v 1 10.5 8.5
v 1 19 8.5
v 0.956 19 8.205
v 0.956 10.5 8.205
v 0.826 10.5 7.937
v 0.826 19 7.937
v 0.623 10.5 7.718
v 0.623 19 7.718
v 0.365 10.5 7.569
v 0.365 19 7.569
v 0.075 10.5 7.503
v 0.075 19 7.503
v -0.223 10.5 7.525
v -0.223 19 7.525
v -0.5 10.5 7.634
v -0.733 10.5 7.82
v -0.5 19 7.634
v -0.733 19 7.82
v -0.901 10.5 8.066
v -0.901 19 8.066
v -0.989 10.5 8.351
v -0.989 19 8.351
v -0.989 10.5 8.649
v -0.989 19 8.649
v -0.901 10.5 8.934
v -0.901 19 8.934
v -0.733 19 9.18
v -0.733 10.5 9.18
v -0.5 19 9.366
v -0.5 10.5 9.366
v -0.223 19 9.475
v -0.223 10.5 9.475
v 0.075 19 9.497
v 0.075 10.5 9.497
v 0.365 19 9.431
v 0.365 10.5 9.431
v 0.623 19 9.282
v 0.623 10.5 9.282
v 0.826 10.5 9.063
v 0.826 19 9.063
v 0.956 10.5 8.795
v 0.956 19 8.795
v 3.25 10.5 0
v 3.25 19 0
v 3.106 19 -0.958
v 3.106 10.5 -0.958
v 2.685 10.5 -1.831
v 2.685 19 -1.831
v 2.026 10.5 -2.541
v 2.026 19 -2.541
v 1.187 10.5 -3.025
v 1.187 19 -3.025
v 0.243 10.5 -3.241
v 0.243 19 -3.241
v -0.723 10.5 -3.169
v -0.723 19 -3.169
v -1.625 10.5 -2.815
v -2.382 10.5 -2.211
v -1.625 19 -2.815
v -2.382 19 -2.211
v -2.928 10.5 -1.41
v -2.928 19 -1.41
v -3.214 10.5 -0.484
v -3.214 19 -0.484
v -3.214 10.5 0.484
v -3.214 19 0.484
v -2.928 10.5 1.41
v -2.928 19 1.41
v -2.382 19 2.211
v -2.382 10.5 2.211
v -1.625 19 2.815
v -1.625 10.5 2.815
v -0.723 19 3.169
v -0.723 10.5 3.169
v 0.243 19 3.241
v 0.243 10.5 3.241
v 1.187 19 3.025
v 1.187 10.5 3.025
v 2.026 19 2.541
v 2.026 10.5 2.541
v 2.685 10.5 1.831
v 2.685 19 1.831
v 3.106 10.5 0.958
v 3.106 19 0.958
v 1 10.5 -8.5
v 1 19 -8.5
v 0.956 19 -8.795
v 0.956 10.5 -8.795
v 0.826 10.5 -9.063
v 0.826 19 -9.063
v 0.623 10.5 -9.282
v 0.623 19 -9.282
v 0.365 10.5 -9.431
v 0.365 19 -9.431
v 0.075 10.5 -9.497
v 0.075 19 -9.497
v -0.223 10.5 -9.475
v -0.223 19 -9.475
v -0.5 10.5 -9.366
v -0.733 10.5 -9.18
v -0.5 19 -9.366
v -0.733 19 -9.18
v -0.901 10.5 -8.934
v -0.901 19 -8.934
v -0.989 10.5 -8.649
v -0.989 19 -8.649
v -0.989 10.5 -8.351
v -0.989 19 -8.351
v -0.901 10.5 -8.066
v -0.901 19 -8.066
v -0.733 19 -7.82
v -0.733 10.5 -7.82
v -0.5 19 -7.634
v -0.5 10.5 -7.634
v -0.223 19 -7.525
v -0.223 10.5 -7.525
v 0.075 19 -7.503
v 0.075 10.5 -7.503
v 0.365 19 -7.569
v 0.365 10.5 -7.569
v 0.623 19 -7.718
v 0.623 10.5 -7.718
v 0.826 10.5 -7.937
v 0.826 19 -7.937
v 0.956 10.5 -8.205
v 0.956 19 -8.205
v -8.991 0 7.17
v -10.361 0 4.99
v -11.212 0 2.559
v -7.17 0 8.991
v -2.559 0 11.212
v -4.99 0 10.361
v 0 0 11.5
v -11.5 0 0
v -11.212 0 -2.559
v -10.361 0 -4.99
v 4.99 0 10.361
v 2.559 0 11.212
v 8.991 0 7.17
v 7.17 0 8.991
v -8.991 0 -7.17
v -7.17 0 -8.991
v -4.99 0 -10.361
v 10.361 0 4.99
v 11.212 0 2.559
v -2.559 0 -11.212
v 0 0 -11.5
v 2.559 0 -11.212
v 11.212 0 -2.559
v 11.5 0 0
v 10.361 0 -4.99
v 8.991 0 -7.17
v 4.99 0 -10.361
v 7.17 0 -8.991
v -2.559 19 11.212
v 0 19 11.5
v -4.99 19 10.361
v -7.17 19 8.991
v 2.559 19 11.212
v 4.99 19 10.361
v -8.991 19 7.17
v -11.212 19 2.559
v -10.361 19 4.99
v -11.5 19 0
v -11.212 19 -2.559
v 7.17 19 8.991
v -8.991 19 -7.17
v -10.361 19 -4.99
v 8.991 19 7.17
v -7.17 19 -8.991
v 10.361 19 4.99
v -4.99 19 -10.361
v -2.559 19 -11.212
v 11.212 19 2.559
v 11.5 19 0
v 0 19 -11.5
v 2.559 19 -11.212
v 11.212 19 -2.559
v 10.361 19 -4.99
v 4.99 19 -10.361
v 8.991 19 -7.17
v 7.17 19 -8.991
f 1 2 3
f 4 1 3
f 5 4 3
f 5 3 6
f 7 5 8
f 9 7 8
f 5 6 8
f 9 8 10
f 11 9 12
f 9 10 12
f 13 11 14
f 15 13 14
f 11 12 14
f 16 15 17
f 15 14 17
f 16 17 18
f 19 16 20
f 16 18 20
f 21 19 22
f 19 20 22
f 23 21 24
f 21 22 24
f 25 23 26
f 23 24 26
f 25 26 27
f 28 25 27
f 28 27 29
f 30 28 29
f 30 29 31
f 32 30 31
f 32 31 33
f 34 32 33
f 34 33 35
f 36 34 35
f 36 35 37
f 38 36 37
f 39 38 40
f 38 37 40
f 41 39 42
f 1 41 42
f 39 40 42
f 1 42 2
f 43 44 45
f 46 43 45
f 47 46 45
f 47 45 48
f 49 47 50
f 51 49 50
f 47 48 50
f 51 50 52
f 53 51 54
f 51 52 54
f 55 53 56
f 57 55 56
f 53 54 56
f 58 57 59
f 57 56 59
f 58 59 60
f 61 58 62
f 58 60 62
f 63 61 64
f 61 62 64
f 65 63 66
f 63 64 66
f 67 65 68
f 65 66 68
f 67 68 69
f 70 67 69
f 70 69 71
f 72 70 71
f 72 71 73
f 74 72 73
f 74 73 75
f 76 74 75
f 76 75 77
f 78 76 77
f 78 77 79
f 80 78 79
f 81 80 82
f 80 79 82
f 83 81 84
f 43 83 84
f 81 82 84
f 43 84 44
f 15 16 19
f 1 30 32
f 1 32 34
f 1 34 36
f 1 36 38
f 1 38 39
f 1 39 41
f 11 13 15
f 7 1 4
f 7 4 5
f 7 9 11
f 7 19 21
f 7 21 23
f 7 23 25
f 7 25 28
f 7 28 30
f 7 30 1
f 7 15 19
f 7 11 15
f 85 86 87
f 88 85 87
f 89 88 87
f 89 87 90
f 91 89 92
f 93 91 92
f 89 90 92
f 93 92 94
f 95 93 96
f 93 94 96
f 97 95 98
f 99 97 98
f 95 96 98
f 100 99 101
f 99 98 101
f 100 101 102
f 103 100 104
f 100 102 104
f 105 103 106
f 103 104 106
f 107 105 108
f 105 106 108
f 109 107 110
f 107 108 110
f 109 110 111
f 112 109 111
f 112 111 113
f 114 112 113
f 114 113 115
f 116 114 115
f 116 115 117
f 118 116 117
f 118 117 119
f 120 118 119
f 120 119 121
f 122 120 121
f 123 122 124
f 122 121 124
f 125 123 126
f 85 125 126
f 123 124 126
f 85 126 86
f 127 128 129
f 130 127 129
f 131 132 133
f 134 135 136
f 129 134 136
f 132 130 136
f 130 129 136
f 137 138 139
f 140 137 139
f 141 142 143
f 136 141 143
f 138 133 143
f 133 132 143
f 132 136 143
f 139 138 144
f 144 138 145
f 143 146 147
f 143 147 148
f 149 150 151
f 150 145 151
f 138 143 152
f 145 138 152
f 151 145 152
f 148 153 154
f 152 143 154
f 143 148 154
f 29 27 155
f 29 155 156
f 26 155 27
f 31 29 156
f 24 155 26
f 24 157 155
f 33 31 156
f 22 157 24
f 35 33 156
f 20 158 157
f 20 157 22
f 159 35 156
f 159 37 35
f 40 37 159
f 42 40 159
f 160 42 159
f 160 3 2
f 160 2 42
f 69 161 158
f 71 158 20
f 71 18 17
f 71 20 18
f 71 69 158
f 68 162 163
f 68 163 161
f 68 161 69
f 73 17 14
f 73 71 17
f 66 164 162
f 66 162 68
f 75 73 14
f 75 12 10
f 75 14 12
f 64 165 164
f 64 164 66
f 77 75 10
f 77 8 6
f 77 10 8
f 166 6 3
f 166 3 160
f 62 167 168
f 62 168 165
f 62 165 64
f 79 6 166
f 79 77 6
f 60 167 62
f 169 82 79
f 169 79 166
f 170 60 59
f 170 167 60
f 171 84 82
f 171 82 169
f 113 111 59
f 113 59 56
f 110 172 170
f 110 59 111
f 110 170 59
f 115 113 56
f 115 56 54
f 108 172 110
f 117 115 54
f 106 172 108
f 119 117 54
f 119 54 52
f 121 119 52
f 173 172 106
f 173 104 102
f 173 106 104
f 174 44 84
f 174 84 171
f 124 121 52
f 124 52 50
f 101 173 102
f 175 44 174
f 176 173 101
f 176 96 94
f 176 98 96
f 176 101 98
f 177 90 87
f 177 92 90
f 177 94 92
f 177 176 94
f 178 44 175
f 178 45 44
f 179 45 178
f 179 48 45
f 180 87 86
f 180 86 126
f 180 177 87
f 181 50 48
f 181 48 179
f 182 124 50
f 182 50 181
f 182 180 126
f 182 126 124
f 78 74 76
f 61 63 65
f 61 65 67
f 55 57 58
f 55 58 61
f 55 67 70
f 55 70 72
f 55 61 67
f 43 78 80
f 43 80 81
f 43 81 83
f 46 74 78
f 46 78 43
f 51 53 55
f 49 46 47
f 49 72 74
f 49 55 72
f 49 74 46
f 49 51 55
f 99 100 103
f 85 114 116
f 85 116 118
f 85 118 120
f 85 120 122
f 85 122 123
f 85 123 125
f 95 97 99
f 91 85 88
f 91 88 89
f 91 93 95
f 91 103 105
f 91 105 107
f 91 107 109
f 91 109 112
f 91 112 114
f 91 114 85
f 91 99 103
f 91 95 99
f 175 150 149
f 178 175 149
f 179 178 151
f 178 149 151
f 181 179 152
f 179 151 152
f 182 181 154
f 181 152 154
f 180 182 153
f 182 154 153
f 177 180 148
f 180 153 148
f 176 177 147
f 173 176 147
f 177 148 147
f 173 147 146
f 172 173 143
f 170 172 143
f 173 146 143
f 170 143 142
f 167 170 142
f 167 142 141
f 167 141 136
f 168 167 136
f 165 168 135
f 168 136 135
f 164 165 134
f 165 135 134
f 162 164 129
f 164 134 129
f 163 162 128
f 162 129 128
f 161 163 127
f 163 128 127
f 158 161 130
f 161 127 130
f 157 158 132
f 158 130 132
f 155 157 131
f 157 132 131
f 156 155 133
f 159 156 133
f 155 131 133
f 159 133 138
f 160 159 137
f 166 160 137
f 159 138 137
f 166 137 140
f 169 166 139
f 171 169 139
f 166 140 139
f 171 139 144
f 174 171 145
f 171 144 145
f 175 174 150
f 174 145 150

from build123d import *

# Parameters (mm, degrees)
SKETCH1_R           = 11.5
BOSS_EXTRUDE1_DEPTH = 19
SKETCH2_R           = 1
SKETCH2_R_2         = 3.25
CUT_EXTRUDE1_DEPTH  = 8.5


with BuildPart() as part:
    # Sketch1 → Boss-Extrude1 (new body)
    with BuildSketch(Plane(origin=(0, 0, 0), x_dir=(1, 0, 0), z_dir=(0, 1, 0))):
        Circle(SKETCH1_R)
    extrude(amount=BOSS_EXTRUDE1_DEPTH)

    # Sketch2 → Cut-Extrude1 (cut)
    with BuildSketch(Plane(origin=(0, 19, 0), x_dir=(1, 0, 0), z_dir=(0, 1, 0))):
        with Locations((0, 8.5)):
            Circle(SKETCH2_R)
        with Locations((0, -8.5)):
            Circle(SKETCH2_R)
        Circle(SKETCH2_R_2)
    extrude(amount=-CUT_EXTRUDE1_DEPTH, mode=Mode.SUBTRACT)


solid = part.part
